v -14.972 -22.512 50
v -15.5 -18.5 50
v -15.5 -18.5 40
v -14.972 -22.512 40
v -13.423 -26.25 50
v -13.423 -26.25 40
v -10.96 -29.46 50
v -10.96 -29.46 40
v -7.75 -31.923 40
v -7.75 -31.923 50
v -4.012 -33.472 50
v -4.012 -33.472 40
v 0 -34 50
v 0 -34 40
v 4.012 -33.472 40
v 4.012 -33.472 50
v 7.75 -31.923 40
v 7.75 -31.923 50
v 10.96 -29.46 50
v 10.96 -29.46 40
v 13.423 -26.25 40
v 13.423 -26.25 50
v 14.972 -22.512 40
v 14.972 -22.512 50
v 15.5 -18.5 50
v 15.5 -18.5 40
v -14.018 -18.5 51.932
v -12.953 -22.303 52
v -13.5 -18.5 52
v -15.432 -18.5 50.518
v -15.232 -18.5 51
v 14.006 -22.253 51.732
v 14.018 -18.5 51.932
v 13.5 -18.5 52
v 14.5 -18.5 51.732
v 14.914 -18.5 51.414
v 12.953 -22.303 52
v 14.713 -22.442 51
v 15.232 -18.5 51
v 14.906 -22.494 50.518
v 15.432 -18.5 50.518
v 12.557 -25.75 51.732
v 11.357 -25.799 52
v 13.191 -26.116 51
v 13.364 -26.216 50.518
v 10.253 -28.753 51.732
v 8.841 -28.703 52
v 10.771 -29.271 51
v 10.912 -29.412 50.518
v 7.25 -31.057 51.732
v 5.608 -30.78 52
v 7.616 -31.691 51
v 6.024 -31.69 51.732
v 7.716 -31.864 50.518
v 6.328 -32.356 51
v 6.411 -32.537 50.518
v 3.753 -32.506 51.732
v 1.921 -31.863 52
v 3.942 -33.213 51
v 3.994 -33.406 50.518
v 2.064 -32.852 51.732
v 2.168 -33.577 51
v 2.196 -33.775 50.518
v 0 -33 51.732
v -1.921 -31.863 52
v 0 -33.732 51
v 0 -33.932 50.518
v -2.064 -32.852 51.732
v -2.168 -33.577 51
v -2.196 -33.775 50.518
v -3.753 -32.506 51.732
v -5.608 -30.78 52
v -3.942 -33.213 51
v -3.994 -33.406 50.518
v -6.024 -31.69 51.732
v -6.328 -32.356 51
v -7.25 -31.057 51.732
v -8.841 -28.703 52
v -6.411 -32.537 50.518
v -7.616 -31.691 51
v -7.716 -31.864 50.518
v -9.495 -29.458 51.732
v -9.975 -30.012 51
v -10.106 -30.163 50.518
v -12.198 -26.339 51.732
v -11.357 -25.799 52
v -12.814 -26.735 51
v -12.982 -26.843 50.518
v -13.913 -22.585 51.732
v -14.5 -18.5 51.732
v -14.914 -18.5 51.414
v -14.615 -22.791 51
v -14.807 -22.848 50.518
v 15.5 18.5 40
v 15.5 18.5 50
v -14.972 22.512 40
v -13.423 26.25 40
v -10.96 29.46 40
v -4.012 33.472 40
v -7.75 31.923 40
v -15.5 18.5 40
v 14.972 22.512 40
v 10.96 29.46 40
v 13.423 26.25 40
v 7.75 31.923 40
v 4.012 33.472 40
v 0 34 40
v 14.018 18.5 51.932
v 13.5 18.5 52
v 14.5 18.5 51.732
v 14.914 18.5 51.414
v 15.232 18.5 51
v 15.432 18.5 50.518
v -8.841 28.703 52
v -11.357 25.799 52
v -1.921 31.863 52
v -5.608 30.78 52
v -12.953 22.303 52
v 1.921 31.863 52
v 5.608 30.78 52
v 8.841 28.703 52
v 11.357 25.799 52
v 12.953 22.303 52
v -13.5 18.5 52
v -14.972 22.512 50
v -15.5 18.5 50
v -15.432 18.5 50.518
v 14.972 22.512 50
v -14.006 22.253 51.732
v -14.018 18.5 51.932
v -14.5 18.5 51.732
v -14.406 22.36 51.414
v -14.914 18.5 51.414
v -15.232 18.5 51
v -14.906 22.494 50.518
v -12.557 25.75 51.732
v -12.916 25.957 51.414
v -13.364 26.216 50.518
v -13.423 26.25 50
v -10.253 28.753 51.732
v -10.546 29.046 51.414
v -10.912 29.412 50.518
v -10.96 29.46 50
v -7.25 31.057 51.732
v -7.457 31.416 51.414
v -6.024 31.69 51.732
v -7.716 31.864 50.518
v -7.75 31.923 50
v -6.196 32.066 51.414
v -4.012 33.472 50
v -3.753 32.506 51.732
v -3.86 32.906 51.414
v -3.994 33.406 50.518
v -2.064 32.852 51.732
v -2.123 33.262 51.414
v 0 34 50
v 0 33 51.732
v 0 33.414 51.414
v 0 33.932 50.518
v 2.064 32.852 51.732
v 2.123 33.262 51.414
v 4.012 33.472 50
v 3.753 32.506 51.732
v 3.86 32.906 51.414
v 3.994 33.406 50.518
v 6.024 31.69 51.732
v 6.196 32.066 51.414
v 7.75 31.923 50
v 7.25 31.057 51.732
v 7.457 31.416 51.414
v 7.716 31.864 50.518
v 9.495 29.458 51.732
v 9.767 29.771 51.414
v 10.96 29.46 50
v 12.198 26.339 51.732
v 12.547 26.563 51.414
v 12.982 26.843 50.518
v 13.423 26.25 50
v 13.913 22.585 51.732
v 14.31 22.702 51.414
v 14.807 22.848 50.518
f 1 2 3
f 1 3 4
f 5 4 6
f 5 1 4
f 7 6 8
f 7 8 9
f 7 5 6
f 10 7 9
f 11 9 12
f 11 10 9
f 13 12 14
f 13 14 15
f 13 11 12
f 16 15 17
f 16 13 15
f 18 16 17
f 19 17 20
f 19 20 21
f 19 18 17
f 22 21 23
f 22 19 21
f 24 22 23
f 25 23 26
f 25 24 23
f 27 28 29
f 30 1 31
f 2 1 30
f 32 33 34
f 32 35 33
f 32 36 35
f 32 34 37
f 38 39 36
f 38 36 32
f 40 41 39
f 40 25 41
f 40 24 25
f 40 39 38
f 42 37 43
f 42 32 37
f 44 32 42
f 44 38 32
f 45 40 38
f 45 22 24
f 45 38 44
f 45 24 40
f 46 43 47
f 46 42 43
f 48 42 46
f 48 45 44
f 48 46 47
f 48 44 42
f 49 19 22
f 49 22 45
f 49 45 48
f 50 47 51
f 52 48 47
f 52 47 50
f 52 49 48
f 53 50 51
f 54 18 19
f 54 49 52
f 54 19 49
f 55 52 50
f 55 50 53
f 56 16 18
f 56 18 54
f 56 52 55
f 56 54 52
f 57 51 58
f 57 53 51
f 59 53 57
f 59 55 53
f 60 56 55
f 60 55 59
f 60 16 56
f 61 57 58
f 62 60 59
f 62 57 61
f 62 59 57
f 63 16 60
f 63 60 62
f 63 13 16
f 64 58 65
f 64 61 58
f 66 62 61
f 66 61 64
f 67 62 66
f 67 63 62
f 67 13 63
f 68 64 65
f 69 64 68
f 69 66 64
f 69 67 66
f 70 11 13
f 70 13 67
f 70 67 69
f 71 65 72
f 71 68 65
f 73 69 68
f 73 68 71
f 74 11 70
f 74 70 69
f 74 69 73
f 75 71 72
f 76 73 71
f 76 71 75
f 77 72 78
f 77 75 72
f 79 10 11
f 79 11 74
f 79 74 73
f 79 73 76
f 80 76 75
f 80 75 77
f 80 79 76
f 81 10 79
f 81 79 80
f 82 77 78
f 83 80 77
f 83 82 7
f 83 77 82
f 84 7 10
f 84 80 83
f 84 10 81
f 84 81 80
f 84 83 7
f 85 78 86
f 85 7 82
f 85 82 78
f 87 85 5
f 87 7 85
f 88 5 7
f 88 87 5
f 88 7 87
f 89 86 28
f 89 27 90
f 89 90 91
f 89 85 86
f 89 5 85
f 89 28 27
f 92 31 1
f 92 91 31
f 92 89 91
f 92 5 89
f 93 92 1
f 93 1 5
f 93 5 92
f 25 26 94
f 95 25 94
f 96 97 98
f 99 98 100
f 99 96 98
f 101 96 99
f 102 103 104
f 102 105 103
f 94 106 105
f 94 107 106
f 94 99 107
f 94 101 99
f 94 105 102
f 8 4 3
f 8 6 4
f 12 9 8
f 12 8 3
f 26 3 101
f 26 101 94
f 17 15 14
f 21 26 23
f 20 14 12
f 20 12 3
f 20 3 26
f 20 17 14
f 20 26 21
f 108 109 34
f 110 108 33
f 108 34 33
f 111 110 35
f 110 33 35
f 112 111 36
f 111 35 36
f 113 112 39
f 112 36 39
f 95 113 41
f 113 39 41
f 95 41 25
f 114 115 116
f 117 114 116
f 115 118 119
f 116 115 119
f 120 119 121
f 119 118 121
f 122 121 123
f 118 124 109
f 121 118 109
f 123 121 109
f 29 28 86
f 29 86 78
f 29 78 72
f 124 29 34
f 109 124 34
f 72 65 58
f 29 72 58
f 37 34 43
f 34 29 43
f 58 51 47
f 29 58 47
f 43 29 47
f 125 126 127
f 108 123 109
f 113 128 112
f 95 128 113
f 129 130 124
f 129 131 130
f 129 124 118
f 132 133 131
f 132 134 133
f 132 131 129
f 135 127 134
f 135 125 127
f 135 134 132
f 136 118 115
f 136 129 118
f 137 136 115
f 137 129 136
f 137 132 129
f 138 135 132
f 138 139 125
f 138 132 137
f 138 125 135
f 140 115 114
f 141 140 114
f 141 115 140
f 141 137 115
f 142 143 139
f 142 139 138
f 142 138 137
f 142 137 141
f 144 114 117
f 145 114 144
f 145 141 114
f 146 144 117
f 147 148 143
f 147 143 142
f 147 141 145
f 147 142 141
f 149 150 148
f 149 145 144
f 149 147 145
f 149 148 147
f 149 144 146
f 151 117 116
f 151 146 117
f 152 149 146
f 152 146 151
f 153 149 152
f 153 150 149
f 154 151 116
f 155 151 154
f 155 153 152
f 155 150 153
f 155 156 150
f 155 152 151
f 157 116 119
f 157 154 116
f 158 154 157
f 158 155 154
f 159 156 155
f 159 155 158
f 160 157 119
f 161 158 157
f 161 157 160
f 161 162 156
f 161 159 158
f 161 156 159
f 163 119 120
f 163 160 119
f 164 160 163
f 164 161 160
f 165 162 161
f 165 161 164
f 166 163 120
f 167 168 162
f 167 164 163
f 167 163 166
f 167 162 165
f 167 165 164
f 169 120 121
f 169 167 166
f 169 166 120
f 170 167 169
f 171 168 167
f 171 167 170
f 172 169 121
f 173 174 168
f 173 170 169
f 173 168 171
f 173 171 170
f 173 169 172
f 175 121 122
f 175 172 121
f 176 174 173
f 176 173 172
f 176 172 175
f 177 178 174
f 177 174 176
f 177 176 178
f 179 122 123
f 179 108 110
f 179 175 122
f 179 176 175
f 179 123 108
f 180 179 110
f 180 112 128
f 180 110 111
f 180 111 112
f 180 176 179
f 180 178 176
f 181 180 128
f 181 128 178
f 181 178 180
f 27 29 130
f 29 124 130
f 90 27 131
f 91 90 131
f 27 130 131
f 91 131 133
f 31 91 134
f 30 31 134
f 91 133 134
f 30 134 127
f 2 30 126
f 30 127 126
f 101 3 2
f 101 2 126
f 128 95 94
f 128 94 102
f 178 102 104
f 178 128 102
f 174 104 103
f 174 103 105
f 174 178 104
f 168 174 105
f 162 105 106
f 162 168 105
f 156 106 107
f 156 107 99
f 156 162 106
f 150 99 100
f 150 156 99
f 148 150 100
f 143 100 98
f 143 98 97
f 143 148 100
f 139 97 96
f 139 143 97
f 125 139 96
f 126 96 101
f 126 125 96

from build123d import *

# Parameters (mm, degrees)
CYLINDER_W        = 15.5
CYLINDER_H        = 12
CYLINDER_ANGLE    = 180
CYLINDER001_W     = 15.5
CYLINDER001_H     = 12
CYLINDER001_ANGLE = 180
BOX_W             = 31
BOX_H             = 37
BOX_DEPTH         = 12
FILLET_R          = 2


with BuildPart() as grrund:
    # Cylinder → Cylinder (revolve)
    with BuildSketch(Plane.XZ.offset(-18.5)):
        with Locations((7.75, 6)):
            Rectangle(CYLINDER_W, CYLINDER_H)
    revolve(axis=Axis((0, 18.5, 0), (0, 0, 1)), revolution_arc=CYLINDER_ANGLE)


with BuildPart() as grrund2:
    # Cylinder001 → Cylinder001 (revolve)
    with BuildSketch(Plane(origin=(0, -18.5, 0), x_dir=(-1, 0, 0), z_dir=(0, 1, 0))):
        with Locations((7.75, 6)):
            Rectangle(CYLINDER001_W, CYLINDER001_H)
    revolve(axis=Axis((0, -18.5, 0), (0, 0, 1)), revolution_arc=CYLINDER001_ANGLE)


with BuildPart() as griffr:
    # Box → Box (new body)
    with BuildSketch(Plane(origin=(-15.5, -18.5, 0), x_dir=(1, 0, 0), z_dir=(0, 0, 1))):
        with Locations((15.5, 18.5)):
            Rectangle(BOX_W, BOX_H)
    extrude(amount=BOX_DEPTH)

    # Fusion: union GrRund, GrRund2
    add(grrund.part)
    add(grrund2.part)

    # Fillet
    fillet_edges = [griffr.edges().sort_by_distance(p)[0] for p in [
        (-15.5, 0, 12),
    ]]
    fillet(fillet_edges, radius=FILLET_R)


with BuildPart() as griffr_1:
    # Fillet placement: moved
    add(griffr.part.moved(Location((0, 0, 40))))


solid = griffr_1.part
